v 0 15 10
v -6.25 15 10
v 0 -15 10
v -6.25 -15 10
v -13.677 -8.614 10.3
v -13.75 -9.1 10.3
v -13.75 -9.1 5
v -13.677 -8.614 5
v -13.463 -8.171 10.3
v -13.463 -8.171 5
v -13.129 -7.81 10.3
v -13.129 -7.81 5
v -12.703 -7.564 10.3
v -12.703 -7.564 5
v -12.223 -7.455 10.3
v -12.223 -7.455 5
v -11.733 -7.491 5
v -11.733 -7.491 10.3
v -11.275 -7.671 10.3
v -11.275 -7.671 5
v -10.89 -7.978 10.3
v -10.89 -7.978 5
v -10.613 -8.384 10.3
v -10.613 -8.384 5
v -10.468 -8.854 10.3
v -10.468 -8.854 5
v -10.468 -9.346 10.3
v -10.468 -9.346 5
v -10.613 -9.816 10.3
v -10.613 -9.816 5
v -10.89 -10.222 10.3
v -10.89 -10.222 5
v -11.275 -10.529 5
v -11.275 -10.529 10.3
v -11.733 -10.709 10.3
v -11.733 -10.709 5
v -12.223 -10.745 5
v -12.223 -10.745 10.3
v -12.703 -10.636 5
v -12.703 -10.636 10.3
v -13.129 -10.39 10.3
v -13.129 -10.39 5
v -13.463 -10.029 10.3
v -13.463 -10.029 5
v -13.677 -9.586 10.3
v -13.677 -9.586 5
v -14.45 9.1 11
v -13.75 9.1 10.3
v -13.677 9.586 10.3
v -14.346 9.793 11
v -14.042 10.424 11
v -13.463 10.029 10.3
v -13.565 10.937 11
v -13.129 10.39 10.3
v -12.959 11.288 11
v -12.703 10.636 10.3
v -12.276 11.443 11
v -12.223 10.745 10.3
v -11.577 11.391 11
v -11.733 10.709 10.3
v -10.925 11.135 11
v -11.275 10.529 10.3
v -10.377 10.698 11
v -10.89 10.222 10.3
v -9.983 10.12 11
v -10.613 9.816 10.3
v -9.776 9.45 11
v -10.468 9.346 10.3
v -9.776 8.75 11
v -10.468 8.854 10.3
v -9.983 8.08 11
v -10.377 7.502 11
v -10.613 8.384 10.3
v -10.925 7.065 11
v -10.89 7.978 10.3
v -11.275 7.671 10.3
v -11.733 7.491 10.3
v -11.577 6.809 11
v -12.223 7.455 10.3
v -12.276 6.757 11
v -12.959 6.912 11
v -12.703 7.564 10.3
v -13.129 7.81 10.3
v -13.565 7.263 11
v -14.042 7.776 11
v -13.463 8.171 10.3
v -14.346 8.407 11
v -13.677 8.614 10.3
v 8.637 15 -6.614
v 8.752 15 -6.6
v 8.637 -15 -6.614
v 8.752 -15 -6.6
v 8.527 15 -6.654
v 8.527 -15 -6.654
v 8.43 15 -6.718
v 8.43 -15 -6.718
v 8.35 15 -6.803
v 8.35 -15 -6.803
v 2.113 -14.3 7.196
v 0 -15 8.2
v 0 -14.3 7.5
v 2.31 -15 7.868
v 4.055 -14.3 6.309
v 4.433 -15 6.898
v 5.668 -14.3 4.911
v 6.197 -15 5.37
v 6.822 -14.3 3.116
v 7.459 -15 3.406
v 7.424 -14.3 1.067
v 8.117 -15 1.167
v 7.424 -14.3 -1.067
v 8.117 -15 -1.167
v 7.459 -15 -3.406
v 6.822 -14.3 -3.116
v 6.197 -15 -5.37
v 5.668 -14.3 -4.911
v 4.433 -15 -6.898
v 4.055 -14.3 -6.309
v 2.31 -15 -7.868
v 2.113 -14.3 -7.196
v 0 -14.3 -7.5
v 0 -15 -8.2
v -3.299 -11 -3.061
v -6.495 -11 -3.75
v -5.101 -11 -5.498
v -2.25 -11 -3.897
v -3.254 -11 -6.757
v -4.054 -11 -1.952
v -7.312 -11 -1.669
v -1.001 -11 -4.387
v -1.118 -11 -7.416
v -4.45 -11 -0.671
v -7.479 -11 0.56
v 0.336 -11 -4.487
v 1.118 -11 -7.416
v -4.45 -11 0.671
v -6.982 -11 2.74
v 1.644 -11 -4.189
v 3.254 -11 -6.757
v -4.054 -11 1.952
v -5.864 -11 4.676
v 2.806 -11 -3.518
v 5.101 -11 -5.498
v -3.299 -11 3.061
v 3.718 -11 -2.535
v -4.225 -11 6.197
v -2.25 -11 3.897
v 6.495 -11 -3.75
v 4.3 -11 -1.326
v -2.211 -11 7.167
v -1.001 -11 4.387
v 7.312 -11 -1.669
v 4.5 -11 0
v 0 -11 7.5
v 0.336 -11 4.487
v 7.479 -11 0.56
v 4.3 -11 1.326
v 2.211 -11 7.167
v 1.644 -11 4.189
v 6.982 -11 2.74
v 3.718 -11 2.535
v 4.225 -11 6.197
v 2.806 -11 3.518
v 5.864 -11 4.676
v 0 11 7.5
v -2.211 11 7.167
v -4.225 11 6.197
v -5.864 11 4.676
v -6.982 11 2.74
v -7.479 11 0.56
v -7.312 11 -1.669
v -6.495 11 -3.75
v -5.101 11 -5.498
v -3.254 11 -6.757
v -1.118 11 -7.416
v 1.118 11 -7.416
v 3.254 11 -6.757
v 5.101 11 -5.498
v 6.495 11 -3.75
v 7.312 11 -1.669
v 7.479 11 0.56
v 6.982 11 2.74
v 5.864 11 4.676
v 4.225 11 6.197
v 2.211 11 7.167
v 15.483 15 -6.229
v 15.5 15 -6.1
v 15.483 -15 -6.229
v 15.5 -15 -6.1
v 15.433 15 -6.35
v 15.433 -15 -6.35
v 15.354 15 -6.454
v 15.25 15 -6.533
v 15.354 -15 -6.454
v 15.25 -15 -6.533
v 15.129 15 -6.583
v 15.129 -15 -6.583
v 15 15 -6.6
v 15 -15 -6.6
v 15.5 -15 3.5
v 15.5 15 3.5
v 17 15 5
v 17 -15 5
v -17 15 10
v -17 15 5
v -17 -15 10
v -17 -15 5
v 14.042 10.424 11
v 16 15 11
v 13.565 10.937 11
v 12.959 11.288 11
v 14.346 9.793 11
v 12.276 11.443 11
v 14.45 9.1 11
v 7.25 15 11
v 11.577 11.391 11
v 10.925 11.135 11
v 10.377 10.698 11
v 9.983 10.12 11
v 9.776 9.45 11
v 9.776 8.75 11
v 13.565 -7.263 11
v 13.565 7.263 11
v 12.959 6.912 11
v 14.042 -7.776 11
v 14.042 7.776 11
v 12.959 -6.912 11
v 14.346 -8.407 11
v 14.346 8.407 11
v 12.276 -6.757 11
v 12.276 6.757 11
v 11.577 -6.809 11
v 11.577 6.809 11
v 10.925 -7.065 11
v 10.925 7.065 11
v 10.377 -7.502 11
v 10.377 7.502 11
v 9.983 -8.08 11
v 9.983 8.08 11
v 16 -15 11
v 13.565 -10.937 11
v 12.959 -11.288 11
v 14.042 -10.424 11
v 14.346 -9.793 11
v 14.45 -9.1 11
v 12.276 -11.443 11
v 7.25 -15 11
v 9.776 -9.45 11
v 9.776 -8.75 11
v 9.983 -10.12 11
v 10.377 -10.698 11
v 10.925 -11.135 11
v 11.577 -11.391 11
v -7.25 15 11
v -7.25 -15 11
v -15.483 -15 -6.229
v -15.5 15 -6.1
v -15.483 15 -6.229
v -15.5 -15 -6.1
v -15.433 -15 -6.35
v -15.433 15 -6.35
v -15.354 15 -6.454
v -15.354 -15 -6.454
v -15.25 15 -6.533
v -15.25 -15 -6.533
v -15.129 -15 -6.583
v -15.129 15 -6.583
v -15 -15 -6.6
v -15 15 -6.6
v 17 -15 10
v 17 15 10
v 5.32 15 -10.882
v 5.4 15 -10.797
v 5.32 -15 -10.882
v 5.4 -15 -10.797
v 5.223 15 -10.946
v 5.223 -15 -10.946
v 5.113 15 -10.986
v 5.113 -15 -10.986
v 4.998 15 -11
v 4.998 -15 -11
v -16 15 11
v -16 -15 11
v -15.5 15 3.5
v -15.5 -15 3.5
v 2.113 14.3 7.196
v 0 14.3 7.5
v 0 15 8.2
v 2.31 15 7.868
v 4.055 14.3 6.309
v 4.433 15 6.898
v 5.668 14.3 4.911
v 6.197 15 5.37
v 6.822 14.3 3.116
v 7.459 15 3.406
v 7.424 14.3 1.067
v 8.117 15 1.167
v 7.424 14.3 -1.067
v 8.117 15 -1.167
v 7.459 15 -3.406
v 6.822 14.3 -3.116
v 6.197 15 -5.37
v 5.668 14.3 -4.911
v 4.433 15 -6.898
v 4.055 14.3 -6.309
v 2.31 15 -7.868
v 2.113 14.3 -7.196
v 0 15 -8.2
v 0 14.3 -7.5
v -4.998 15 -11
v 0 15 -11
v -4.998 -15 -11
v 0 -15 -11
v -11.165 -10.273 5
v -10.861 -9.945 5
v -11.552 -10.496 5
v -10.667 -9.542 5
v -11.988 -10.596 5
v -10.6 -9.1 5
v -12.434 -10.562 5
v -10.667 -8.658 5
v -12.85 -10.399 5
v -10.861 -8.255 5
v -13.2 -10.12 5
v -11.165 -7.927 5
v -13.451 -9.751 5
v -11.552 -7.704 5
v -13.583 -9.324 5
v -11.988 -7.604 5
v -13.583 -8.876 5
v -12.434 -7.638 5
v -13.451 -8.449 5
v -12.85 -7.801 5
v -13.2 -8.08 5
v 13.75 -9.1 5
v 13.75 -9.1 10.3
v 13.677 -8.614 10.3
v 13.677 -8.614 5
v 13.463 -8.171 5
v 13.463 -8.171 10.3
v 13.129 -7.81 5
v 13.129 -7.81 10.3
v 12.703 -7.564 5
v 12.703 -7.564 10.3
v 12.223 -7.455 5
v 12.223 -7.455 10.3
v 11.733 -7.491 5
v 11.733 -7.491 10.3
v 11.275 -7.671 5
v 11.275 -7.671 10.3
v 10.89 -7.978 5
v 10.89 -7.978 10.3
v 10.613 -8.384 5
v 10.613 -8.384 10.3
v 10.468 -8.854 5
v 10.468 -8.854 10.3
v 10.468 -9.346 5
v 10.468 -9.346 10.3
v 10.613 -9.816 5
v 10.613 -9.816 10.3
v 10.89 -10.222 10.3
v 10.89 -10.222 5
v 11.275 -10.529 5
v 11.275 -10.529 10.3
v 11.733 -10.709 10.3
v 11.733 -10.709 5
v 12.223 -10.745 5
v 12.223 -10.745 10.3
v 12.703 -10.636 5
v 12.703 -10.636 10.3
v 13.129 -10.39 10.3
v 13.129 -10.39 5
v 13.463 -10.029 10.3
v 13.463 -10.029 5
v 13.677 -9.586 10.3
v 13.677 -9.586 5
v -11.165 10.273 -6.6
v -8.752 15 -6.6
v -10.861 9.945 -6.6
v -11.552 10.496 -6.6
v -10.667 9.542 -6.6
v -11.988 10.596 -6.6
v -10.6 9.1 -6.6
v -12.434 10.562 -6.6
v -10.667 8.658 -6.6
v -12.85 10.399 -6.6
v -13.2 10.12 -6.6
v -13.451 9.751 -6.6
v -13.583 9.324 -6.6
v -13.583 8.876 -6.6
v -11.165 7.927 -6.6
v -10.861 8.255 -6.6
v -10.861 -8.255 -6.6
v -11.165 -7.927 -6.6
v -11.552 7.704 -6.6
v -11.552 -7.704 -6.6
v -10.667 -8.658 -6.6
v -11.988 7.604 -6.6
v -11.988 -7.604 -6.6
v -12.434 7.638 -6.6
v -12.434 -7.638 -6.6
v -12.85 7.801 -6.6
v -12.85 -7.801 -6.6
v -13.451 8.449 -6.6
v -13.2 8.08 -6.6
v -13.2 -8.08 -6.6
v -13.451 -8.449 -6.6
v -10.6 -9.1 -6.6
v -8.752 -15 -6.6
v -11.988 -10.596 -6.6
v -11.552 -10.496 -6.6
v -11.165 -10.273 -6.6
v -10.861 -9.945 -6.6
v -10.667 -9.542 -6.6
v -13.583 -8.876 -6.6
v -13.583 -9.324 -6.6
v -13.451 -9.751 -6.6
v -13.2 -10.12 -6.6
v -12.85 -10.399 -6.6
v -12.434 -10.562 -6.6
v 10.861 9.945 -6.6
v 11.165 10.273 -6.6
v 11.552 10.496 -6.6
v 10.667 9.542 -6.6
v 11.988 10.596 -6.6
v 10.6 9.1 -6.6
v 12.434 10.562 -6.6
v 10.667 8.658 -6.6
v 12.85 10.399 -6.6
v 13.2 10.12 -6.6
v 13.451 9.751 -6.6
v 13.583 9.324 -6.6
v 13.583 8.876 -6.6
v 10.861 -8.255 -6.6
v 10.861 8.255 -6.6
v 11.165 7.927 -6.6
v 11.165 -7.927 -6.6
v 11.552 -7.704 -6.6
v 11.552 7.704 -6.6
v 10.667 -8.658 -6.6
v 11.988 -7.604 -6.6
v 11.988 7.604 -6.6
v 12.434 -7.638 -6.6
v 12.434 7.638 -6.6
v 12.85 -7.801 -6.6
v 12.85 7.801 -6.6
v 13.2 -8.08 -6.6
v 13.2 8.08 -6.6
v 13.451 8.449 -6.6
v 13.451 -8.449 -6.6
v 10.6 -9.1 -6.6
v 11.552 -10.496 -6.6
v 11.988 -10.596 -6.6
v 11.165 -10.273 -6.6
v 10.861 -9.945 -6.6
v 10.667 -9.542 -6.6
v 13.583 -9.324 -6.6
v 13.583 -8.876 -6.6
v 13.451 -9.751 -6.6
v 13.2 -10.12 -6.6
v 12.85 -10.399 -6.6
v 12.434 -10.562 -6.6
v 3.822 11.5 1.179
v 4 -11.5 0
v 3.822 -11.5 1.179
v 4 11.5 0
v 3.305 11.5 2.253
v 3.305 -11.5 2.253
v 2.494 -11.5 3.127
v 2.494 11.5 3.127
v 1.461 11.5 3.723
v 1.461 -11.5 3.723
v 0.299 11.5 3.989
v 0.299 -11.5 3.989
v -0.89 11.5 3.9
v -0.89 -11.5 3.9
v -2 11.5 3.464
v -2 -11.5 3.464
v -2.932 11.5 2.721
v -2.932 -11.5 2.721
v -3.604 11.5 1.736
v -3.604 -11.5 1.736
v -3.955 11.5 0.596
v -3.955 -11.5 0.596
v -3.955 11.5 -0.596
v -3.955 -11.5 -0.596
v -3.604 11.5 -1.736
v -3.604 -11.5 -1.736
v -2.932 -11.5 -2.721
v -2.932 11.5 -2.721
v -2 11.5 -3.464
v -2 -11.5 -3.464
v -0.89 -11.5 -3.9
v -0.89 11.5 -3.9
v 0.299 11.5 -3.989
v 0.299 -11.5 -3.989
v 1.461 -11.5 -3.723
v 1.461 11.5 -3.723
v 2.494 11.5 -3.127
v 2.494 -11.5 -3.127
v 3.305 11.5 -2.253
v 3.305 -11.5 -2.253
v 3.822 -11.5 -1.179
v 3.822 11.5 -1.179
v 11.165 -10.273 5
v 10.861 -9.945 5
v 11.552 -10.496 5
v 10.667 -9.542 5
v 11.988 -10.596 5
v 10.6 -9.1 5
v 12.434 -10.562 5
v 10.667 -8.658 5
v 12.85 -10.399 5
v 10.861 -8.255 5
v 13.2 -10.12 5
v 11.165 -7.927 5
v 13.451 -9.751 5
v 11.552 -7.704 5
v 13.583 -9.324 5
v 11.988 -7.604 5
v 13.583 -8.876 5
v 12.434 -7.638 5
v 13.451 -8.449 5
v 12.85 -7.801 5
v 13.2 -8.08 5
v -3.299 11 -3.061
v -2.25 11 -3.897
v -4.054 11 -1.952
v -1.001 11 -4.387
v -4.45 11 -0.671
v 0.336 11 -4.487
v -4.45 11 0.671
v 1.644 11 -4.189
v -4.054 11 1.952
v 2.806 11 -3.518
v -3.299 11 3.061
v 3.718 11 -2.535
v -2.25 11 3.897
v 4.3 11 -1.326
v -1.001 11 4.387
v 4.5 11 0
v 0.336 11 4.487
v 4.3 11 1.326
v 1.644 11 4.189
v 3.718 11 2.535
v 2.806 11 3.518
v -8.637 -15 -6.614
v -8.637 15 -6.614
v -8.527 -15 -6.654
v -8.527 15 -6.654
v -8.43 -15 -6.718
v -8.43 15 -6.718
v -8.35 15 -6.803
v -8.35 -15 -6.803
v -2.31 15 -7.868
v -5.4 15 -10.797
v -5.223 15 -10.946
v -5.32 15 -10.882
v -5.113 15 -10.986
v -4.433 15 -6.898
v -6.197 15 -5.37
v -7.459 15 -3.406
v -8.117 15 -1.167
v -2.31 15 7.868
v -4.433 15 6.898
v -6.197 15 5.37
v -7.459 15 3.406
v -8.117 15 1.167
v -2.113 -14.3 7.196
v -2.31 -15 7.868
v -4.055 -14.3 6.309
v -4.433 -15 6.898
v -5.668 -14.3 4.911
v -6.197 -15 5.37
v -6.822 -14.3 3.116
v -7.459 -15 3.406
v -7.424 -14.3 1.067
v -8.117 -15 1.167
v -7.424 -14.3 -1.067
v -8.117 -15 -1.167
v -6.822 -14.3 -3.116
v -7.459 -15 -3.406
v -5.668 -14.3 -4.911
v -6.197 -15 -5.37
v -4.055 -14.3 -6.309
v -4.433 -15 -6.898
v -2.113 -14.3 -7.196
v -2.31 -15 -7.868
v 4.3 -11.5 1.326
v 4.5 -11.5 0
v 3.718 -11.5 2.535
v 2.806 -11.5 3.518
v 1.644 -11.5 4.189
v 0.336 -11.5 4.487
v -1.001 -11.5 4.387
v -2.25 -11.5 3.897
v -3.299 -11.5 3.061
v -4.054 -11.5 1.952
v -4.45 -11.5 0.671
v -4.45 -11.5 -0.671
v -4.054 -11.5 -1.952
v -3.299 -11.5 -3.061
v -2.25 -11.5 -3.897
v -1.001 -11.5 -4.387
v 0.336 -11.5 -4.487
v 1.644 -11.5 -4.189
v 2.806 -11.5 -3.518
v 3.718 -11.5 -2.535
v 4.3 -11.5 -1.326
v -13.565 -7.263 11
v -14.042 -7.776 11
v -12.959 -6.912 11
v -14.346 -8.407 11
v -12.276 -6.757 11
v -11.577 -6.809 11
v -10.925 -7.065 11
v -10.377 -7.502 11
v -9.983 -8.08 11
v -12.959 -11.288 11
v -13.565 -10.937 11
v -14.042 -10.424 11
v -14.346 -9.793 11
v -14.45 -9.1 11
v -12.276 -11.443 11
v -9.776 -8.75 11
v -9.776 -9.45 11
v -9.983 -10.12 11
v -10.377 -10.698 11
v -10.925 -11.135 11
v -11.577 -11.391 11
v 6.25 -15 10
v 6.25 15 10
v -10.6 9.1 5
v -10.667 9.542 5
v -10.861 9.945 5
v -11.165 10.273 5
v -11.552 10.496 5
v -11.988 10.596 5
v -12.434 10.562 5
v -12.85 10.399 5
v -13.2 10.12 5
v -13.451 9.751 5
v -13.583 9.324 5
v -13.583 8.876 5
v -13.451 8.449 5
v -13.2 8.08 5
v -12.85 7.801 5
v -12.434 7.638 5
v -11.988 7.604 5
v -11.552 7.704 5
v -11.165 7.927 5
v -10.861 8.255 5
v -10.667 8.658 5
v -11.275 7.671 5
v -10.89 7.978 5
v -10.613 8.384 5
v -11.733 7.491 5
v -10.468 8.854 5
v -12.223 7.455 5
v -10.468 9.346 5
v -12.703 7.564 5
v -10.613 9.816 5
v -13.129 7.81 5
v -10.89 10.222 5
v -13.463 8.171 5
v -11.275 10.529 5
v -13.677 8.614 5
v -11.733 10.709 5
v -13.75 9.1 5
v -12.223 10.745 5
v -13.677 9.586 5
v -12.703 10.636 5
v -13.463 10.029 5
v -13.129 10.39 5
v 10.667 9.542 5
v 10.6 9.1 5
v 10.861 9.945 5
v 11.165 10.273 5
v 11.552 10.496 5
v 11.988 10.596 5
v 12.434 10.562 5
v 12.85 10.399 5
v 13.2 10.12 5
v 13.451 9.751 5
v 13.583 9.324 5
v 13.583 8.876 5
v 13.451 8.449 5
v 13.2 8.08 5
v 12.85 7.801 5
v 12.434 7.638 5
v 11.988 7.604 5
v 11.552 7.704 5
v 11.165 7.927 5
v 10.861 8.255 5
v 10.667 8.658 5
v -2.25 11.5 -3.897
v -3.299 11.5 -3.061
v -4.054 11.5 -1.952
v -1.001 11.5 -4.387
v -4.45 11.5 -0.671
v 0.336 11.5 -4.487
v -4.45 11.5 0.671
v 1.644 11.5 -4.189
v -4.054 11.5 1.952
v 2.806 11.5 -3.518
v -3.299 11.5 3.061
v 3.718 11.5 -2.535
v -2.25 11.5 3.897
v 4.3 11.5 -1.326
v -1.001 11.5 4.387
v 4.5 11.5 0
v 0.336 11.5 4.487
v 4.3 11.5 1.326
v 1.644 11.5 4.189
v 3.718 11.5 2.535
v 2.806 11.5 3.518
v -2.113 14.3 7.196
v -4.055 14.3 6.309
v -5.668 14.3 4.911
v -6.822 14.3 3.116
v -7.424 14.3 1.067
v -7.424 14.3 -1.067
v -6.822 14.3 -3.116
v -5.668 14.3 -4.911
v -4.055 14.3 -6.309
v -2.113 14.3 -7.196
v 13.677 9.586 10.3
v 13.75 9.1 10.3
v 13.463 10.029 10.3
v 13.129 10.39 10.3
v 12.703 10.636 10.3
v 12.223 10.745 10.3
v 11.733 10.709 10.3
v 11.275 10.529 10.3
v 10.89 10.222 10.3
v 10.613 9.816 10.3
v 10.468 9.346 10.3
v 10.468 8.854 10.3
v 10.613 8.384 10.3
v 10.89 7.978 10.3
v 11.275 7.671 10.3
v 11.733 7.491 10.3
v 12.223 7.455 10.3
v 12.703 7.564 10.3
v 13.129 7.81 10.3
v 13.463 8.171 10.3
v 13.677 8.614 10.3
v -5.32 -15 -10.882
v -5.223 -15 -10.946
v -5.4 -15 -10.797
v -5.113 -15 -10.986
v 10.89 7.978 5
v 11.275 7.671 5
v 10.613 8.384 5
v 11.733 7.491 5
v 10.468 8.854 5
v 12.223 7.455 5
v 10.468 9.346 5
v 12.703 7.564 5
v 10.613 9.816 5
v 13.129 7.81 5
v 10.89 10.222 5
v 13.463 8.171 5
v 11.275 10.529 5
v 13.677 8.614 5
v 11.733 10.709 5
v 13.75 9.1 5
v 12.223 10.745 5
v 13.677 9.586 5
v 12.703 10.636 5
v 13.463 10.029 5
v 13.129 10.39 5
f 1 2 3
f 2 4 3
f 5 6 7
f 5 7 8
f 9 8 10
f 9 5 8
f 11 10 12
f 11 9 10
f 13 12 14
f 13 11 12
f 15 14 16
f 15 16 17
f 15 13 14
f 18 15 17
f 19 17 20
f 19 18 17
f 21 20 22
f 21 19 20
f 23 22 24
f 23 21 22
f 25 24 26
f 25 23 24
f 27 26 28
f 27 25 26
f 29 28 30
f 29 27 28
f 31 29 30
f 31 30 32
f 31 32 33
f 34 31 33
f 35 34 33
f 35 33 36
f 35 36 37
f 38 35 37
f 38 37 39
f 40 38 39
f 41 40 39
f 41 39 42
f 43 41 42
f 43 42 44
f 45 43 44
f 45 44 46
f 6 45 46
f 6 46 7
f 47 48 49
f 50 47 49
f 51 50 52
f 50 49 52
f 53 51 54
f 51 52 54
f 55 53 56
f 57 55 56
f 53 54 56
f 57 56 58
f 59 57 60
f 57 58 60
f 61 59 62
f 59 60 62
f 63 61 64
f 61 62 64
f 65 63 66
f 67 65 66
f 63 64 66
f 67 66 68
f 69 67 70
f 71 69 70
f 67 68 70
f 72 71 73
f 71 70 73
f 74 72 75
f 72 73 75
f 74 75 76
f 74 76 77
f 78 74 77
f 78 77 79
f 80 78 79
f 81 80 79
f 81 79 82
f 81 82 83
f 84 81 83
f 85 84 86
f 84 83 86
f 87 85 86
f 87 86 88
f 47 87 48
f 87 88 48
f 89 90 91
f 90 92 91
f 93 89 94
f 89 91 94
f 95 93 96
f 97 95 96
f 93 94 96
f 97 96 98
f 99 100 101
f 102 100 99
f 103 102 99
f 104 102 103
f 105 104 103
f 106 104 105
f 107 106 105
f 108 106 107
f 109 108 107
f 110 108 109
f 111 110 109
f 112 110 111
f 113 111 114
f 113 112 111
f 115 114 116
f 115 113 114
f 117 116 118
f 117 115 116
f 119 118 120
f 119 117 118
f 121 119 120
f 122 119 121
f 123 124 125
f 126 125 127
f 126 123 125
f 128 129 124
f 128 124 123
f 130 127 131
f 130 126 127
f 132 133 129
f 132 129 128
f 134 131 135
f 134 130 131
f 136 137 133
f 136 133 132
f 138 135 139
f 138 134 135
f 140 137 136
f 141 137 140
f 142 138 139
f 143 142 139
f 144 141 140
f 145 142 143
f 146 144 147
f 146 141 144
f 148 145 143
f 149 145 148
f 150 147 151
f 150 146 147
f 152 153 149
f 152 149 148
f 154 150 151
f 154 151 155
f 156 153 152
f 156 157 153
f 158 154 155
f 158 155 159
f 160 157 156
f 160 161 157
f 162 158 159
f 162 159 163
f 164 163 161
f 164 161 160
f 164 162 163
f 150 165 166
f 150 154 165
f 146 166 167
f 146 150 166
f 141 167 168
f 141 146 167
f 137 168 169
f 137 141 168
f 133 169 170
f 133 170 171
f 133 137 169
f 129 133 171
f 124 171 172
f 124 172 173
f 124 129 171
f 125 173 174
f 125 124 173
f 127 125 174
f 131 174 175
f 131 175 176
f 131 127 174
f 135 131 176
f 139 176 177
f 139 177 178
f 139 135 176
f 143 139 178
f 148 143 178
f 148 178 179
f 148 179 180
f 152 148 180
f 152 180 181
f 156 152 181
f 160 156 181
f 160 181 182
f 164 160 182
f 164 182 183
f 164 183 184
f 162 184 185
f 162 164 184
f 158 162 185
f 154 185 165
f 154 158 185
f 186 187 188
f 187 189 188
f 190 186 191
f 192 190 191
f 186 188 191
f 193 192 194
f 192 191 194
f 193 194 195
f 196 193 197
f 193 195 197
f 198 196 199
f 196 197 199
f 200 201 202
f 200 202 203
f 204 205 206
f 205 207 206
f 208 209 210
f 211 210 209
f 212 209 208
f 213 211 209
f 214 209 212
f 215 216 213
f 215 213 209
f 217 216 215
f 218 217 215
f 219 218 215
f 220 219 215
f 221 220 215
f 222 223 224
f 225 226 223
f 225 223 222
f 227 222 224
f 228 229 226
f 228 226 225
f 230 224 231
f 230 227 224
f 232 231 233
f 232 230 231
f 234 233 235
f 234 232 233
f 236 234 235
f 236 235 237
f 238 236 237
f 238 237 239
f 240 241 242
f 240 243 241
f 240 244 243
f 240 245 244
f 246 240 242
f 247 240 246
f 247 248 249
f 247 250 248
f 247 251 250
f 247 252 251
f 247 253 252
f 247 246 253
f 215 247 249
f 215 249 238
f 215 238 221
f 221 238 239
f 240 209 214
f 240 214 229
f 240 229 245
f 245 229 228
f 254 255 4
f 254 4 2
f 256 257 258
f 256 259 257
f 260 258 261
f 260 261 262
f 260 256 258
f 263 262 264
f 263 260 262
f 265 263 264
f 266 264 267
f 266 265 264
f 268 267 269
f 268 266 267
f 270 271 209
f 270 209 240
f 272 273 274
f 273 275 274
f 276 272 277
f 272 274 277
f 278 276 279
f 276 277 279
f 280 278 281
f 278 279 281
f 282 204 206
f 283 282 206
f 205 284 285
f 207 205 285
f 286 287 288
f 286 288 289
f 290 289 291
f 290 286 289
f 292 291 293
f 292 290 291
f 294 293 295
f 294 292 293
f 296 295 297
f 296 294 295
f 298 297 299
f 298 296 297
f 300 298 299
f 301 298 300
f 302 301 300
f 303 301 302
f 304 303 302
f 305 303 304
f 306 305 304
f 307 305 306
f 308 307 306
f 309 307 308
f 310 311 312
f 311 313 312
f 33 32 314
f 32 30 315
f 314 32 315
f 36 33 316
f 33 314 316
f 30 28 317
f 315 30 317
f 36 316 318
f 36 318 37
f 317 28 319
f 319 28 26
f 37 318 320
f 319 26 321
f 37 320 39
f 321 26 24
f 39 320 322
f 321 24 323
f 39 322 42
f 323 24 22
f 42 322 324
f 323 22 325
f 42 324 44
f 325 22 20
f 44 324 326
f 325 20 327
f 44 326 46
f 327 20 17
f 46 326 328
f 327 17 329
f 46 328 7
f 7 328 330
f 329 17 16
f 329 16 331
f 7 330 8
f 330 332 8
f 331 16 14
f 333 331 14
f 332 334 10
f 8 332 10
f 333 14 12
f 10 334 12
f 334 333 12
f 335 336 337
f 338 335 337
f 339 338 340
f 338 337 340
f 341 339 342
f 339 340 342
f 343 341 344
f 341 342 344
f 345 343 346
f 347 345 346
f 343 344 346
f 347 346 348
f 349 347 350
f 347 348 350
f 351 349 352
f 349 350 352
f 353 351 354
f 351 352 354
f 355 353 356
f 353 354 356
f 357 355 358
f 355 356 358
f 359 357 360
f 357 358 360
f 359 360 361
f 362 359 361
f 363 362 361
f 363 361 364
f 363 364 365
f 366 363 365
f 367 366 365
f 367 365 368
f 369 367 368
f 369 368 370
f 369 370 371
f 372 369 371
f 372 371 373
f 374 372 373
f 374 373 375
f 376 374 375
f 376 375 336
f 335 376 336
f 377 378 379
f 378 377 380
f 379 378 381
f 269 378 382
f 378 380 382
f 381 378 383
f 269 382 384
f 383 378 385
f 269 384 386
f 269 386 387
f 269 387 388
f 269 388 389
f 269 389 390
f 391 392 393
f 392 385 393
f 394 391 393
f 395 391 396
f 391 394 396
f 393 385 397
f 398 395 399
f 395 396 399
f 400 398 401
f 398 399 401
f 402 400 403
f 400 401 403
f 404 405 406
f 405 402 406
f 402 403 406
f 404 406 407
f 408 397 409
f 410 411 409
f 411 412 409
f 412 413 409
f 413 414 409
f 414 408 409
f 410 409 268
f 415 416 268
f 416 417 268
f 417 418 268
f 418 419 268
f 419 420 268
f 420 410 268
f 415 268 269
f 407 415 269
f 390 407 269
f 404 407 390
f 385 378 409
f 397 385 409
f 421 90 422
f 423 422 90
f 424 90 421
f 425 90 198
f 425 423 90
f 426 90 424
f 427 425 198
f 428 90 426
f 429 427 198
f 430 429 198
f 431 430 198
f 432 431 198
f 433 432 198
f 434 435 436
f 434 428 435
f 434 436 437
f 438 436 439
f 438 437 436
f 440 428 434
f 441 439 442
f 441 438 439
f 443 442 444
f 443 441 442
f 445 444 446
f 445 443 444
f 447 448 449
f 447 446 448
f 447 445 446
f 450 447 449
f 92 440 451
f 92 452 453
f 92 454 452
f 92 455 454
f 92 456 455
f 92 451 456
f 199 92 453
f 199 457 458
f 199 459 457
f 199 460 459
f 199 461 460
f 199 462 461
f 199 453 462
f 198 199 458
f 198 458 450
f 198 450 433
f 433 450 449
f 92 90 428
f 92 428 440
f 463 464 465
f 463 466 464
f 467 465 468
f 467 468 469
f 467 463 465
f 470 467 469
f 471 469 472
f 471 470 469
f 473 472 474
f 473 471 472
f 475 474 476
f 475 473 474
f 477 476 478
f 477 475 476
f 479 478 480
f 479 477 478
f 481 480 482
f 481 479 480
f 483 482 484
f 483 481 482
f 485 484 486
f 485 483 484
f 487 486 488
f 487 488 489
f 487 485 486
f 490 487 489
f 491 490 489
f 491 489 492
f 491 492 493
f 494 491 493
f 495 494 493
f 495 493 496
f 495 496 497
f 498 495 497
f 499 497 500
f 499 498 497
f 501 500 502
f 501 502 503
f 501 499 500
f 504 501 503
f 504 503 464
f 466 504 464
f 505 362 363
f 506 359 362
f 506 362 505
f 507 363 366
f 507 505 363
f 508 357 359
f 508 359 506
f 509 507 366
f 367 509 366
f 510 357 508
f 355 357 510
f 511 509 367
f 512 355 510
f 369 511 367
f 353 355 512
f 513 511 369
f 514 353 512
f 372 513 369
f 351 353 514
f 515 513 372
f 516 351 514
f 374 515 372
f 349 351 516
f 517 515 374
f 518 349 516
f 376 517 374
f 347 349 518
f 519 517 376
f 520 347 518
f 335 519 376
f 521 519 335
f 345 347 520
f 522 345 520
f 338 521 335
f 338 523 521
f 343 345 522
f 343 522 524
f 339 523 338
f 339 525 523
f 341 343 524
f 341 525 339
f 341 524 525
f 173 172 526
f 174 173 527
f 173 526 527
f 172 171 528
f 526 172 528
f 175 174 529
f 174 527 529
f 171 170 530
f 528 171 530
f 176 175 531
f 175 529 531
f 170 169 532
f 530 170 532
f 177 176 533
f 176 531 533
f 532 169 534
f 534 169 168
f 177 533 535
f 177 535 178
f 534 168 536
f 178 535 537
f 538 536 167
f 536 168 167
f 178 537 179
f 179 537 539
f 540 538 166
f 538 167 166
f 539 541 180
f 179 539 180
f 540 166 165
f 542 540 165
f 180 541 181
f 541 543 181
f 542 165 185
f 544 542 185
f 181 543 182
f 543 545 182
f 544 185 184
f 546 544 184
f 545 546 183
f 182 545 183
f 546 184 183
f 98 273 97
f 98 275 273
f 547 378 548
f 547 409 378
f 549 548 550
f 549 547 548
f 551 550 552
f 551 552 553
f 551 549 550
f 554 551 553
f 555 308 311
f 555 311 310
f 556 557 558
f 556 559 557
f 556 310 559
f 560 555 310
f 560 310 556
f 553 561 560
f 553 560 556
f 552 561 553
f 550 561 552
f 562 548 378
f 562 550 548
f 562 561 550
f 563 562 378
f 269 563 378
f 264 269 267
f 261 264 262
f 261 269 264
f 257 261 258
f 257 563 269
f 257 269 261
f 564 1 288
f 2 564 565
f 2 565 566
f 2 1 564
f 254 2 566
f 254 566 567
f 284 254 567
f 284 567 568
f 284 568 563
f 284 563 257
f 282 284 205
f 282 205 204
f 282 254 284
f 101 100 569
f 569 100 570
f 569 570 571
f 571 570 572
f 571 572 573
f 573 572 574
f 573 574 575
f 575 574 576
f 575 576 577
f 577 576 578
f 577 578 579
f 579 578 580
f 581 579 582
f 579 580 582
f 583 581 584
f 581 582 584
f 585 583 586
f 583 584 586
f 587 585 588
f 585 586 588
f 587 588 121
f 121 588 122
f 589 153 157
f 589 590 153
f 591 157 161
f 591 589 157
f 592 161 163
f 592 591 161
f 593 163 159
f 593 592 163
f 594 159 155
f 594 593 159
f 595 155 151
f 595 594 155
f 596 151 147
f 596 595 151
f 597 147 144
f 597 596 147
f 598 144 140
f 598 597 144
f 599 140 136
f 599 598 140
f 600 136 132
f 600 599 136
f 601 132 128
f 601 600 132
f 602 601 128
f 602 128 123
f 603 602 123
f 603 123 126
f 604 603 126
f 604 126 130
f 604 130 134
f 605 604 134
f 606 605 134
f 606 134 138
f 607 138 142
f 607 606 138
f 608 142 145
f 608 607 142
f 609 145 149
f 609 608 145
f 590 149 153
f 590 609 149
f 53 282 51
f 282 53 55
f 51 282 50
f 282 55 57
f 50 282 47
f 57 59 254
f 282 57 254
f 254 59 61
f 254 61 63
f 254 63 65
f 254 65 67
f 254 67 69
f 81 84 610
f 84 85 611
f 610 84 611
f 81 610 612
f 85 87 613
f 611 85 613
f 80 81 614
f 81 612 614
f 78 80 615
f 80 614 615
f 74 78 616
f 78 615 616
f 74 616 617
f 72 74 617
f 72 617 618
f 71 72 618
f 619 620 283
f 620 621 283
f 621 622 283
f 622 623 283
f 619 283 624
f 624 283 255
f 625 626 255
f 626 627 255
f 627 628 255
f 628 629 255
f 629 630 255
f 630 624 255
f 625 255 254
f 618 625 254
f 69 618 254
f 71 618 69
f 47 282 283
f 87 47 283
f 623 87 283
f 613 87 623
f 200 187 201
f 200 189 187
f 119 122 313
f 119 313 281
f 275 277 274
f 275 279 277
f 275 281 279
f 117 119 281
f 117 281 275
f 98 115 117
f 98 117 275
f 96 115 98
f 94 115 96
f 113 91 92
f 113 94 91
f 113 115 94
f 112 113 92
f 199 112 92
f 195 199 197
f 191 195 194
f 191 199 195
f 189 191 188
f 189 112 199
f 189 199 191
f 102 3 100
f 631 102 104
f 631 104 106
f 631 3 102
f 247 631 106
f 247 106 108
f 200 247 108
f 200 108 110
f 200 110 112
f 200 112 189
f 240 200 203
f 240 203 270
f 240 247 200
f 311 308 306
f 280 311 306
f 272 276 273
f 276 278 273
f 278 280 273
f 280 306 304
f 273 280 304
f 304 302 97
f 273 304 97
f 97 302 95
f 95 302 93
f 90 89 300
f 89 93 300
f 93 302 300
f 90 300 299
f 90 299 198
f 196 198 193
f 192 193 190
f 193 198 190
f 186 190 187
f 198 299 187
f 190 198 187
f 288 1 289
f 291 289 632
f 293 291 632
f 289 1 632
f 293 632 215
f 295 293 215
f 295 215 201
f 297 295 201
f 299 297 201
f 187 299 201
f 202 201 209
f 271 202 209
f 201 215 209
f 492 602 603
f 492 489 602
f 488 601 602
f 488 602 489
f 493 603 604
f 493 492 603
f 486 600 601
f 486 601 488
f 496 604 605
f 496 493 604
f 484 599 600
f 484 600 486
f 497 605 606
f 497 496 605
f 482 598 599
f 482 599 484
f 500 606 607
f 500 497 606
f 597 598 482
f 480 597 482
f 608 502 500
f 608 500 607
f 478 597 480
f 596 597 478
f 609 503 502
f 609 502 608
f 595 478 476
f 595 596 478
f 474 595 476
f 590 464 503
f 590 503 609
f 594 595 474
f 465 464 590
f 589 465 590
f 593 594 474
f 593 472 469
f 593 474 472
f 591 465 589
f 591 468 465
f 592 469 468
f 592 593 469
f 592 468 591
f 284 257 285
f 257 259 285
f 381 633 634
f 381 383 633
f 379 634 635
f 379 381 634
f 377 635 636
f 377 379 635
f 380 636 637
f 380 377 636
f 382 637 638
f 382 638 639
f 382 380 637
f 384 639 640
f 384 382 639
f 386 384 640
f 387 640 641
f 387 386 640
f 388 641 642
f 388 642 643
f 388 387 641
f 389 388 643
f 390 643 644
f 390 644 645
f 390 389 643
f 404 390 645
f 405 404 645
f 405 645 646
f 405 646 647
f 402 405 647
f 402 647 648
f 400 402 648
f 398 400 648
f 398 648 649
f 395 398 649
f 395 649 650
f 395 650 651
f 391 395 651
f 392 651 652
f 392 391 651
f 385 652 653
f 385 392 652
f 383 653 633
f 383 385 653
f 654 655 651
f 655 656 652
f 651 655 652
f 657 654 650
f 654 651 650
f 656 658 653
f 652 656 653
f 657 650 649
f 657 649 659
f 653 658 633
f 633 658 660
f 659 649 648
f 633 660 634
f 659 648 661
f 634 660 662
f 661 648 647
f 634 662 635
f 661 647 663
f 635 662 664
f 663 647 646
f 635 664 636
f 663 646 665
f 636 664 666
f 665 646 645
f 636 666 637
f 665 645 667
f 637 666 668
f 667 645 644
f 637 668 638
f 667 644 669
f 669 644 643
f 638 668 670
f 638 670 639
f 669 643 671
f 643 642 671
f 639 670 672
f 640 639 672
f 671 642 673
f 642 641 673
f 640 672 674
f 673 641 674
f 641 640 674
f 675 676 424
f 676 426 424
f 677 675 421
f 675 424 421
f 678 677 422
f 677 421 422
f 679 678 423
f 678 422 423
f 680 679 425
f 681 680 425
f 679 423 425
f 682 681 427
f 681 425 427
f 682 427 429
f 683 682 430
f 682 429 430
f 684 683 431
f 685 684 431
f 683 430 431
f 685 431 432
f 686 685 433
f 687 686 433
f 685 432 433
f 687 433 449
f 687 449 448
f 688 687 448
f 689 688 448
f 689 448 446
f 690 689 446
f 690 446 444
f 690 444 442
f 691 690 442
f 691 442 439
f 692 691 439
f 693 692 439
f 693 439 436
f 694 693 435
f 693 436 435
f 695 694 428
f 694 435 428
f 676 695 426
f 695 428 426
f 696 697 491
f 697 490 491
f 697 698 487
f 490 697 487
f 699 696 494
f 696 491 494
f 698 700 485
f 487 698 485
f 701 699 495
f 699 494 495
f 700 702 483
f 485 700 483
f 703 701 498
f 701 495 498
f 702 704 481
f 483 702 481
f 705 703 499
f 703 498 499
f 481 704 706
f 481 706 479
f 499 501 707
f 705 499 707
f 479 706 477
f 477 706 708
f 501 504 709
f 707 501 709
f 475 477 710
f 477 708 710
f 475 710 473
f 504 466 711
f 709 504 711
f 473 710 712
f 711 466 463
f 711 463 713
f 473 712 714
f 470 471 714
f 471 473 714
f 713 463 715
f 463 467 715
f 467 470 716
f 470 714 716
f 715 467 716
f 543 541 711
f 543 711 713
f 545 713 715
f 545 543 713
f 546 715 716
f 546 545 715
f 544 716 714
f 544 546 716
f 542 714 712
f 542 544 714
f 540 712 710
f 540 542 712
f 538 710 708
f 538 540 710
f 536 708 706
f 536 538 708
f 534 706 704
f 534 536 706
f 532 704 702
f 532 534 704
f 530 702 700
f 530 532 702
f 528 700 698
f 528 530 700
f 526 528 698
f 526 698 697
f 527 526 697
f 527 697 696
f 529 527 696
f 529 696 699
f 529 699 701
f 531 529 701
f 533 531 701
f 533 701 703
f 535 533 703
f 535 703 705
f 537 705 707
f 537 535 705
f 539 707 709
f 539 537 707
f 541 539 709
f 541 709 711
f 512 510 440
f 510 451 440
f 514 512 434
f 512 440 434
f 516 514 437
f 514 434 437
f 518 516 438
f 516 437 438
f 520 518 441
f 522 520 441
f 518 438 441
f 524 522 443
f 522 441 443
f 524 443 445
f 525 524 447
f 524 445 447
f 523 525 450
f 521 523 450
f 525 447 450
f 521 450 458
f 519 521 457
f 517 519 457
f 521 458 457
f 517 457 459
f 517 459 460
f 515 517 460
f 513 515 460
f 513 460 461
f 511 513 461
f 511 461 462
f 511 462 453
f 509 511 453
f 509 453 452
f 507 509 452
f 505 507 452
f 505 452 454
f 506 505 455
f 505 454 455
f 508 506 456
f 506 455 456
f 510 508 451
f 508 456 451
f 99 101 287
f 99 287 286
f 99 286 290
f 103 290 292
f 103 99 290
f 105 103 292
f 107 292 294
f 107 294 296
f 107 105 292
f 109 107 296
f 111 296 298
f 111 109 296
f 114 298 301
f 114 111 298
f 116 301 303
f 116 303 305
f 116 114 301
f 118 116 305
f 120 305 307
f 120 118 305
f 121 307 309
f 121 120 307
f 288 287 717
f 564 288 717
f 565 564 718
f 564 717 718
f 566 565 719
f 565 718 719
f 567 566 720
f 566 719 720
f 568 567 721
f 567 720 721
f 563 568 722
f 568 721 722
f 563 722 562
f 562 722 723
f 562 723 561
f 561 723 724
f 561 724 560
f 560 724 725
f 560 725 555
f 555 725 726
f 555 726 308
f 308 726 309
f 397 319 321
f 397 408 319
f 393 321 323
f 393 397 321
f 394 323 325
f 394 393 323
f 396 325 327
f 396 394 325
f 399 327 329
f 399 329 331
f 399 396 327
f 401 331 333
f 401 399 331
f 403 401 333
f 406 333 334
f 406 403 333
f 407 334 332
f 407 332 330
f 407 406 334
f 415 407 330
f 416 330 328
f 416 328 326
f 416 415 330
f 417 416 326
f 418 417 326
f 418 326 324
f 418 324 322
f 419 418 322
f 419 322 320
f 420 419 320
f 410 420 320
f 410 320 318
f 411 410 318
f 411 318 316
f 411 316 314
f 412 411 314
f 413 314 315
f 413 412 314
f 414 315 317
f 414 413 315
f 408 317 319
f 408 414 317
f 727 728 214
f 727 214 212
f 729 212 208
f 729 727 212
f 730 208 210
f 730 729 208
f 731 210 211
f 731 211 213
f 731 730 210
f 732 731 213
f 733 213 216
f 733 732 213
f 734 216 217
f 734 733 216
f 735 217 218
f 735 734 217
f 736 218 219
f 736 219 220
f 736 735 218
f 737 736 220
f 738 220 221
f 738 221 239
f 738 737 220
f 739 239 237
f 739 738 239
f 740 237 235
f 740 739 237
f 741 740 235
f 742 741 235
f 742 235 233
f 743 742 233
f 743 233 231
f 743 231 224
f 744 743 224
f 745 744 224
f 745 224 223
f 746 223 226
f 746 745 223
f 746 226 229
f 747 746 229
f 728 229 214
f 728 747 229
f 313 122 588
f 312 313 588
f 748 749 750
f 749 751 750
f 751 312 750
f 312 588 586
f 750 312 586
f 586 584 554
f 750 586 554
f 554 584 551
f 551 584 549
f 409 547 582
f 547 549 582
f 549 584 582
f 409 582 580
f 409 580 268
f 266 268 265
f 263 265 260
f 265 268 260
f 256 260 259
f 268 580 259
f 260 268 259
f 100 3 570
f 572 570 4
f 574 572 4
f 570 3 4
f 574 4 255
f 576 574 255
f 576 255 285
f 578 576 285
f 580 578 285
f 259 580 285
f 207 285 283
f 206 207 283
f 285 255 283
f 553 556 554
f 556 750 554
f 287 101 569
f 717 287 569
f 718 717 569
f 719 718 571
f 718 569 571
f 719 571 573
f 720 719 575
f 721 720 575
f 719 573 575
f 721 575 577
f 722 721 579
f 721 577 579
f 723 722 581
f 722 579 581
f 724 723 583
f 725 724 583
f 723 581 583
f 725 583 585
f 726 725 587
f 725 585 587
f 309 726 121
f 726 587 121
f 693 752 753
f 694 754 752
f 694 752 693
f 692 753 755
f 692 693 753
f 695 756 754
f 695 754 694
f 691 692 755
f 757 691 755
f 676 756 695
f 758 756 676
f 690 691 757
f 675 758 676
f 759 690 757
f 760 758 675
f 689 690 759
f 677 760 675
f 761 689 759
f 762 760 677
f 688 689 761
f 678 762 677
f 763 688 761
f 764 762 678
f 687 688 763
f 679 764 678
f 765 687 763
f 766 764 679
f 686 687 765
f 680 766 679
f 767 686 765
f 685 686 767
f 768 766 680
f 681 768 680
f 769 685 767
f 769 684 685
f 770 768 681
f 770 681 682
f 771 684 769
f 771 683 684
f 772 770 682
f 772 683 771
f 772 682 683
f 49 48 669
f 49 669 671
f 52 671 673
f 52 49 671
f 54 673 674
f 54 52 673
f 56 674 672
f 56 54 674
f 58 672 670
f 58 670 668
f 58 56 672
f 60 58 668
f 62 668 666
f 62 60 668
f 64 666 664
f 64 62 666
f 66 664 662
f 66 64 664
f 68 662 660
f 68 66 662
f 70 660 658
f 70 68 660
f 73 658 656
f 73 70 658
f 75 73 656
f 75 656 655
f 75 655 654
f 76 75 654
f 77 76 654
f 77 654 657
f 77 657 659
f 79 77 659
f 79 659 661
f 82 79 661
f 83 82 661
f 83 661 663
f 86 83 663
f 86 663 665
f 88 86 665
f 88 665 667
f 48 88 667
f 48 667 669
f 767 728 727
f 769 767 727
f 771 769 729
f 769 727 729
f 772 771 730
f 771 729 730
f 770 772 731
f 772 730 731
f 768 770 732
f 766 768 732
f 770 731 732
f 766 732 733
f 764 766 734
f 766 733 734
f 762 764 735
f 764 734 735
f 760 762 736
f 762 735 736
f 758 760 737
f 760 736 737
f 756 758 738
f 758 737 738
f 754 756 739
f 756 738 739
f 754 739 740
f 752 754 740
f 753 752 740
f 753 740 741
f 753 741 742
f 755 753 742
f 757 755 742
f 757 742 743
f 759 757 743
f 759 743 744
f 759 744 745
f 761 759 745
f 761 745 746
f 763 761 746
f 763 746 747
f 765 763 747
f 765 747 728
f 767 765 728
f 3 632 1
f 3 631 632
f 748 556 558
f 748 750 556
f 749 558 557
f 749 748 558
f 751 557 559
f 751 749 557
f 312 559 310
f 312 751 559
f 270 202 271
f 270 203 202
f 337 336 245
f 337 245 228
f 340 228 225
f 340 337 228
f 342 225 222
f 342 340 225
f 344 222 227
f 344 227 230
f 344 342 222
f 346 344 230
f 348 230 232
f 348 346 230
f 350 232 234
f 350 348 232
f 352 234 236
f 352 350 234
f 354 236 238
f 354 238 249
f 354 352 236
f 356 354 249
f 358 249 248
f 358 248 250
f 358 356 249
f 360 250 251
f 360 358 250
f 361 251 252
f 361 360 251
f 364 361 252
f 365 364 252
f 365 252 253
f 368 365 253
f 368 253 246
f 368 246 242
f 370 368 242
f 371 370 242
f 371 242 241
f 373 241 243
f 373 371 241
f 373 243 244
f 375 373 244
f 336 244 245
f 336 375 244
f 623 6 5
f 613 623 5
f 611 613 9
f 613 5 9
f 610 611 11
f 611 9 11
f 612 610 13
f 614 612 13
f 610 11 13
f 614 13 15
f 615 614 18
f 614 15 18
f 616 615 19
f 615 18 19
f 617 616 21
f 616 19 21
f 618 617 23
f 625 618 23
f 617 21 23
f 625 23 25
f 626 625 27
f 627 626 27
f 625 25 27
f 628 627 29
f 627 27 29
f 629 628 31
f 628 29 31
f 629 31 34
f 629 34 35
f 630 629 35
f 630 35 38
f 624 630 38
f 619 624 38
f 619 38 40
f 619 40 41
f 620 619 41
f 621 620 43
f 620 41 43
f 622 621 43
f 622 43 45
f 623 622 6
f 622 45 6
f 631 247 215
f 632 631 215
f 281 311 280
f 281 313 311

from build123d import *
from build123d import SkipClean  # not in build123d's __all__

# Parameters (mm, degrees)
F1_DEPTH       = 15
F2_SIZE        = 0.99999
F3_SIZE        = 1.49999
F4_R           = 0.5
F6_D           = 3
F6_CBORE_D     = 3.3
F6_CBORE_DEPTH = 6
F7_SIZE        = 0.7
F0_R           = 4.5
F8_DEPTH       = 11
F0_R_2         = 4
F9_DEPTH       = 11.5


# Not quite as in the source:
# - a fillet or chamfer is up to 0.001 mm smaller than in the source, because OpenCascade refuses the exact size


with BuildPart() as f1:
    # F0 (on Front) → F1 (new body, symmetric)
    with BuildSketch(Plane.XZ):
        with BuildLine():
            ThreePointArc((0, 7.5), (5.3033008589, 5.3033008589), (7.5, 0))
            ThreePointArc((7.5, 0), (5.3033008589, -5.3033008589), (0, -7.5))
            Line((0, -7.5), (0, -11))
            Line((0, -11), (5.25, -11))
            Line((5.25, -11), (8.5, -6.6))
            Line((8.5, -6.6), (15.5, -6.6))
            Line((15.5, -6.6), (15.5, 3.5))
            Line((15.5, 3.5), (17, 3.5))
            Line((17, 3.5), (17, 11))
            Line((17, 11), (7.25, 11))
            Line((7.25, 11), (7.25, 10))
            Line((7.25, 10), (0, 10))
            Line((0, 10), (0, 7.5))
        make_face()
    extrude(amount=F1_DEPTH, both=True)

    # F2 (size 1 in the source; OpenCascade refuses exactly that, so slightly less here)
    f2_edges = [f1.edges().sort_by_distance(p)[0] for p in [
        (7.25, 0, 10),
        (17, 0, 11),
    ]]
    chamfer(f2_edges, length=F2_SIZE)

    # F3 (size 1.5 in the source; OpenCascade refuses exactly that, so slightly less here)
    f3_edges = [f1.edges().sort_by_distance(p)[0] for p in [
        (17, 0, 3.5),
    ]]
    chamfer(f3_edges, length=F3_SIZE)

    # F4
    f4_edges = [f1.edges().sort_by_distance(p)[0] for p in [
        (15.5, 0, -6.6),
        (8.5, 0, -6.6),
        (5.25, 0, -11),
    ]]
    fillet(f4_edges, radius=F4_R)

    # F6 (through all)
    with Locations(Plane.XY.offset(11)):
        with Locations((12.1, 9.1), (12.1, -9.1)):
            CounterBoreHole(F6_D / 2, F6_CBORE_D / 2, F6_CBORE_DEPTH)

    # F7
    f7_edges = [f1.edges().sort_by_distance(p)[0] for p in [
        (7.5, -15, 0),
        (7.5, 15, 0),
        (10.45, 9.1, 11),
        (10.45, -9.1, 11),
    ]]
    chamfer(f7_edges, length=F7_SIZE)

    # F10: F1 across plane


with BuildPart() as f8:
    # F0 (on Front) → F8 (new body, symmetric)
    with BuildSketch(Plane.XZ):
        with BuildLine():
            ThreePointArc((0, -7.5), (5.3033008589, -5.3033008589), (7.5, 0))
            ThreePointArc((7.5, 0), (5.3033008589, 5.3033008589), (0, 7.5))
            ThreePointArc((0, 7.5), (-7.5, 0), (0, -7.5))
        make_face()
        Circle(F0_R, mode=Mode.SUBTRACT)
    extrude(amount=F8_DEPTH, both=True)

    # F0 (on Front) → F9 (join, symmetric)
    with BuildSketch(Plane.XZ):
        Circle(F0_R)
        Circle(F0_R_2, mode=Mode.SUBTRACT)
    extrude(amount=F9_DEPTH, both=True)


with BuildPart() as f1_1:
    add(f1.part, clean=False)
    with SkipClean():  # cleaning this boolean's faces spoils the solid; the shape is the same uncleaned
        add(f1.part.mirror(Plane.YZ), clean=False)


solid = Compound([f8.part, f1_1.part])
